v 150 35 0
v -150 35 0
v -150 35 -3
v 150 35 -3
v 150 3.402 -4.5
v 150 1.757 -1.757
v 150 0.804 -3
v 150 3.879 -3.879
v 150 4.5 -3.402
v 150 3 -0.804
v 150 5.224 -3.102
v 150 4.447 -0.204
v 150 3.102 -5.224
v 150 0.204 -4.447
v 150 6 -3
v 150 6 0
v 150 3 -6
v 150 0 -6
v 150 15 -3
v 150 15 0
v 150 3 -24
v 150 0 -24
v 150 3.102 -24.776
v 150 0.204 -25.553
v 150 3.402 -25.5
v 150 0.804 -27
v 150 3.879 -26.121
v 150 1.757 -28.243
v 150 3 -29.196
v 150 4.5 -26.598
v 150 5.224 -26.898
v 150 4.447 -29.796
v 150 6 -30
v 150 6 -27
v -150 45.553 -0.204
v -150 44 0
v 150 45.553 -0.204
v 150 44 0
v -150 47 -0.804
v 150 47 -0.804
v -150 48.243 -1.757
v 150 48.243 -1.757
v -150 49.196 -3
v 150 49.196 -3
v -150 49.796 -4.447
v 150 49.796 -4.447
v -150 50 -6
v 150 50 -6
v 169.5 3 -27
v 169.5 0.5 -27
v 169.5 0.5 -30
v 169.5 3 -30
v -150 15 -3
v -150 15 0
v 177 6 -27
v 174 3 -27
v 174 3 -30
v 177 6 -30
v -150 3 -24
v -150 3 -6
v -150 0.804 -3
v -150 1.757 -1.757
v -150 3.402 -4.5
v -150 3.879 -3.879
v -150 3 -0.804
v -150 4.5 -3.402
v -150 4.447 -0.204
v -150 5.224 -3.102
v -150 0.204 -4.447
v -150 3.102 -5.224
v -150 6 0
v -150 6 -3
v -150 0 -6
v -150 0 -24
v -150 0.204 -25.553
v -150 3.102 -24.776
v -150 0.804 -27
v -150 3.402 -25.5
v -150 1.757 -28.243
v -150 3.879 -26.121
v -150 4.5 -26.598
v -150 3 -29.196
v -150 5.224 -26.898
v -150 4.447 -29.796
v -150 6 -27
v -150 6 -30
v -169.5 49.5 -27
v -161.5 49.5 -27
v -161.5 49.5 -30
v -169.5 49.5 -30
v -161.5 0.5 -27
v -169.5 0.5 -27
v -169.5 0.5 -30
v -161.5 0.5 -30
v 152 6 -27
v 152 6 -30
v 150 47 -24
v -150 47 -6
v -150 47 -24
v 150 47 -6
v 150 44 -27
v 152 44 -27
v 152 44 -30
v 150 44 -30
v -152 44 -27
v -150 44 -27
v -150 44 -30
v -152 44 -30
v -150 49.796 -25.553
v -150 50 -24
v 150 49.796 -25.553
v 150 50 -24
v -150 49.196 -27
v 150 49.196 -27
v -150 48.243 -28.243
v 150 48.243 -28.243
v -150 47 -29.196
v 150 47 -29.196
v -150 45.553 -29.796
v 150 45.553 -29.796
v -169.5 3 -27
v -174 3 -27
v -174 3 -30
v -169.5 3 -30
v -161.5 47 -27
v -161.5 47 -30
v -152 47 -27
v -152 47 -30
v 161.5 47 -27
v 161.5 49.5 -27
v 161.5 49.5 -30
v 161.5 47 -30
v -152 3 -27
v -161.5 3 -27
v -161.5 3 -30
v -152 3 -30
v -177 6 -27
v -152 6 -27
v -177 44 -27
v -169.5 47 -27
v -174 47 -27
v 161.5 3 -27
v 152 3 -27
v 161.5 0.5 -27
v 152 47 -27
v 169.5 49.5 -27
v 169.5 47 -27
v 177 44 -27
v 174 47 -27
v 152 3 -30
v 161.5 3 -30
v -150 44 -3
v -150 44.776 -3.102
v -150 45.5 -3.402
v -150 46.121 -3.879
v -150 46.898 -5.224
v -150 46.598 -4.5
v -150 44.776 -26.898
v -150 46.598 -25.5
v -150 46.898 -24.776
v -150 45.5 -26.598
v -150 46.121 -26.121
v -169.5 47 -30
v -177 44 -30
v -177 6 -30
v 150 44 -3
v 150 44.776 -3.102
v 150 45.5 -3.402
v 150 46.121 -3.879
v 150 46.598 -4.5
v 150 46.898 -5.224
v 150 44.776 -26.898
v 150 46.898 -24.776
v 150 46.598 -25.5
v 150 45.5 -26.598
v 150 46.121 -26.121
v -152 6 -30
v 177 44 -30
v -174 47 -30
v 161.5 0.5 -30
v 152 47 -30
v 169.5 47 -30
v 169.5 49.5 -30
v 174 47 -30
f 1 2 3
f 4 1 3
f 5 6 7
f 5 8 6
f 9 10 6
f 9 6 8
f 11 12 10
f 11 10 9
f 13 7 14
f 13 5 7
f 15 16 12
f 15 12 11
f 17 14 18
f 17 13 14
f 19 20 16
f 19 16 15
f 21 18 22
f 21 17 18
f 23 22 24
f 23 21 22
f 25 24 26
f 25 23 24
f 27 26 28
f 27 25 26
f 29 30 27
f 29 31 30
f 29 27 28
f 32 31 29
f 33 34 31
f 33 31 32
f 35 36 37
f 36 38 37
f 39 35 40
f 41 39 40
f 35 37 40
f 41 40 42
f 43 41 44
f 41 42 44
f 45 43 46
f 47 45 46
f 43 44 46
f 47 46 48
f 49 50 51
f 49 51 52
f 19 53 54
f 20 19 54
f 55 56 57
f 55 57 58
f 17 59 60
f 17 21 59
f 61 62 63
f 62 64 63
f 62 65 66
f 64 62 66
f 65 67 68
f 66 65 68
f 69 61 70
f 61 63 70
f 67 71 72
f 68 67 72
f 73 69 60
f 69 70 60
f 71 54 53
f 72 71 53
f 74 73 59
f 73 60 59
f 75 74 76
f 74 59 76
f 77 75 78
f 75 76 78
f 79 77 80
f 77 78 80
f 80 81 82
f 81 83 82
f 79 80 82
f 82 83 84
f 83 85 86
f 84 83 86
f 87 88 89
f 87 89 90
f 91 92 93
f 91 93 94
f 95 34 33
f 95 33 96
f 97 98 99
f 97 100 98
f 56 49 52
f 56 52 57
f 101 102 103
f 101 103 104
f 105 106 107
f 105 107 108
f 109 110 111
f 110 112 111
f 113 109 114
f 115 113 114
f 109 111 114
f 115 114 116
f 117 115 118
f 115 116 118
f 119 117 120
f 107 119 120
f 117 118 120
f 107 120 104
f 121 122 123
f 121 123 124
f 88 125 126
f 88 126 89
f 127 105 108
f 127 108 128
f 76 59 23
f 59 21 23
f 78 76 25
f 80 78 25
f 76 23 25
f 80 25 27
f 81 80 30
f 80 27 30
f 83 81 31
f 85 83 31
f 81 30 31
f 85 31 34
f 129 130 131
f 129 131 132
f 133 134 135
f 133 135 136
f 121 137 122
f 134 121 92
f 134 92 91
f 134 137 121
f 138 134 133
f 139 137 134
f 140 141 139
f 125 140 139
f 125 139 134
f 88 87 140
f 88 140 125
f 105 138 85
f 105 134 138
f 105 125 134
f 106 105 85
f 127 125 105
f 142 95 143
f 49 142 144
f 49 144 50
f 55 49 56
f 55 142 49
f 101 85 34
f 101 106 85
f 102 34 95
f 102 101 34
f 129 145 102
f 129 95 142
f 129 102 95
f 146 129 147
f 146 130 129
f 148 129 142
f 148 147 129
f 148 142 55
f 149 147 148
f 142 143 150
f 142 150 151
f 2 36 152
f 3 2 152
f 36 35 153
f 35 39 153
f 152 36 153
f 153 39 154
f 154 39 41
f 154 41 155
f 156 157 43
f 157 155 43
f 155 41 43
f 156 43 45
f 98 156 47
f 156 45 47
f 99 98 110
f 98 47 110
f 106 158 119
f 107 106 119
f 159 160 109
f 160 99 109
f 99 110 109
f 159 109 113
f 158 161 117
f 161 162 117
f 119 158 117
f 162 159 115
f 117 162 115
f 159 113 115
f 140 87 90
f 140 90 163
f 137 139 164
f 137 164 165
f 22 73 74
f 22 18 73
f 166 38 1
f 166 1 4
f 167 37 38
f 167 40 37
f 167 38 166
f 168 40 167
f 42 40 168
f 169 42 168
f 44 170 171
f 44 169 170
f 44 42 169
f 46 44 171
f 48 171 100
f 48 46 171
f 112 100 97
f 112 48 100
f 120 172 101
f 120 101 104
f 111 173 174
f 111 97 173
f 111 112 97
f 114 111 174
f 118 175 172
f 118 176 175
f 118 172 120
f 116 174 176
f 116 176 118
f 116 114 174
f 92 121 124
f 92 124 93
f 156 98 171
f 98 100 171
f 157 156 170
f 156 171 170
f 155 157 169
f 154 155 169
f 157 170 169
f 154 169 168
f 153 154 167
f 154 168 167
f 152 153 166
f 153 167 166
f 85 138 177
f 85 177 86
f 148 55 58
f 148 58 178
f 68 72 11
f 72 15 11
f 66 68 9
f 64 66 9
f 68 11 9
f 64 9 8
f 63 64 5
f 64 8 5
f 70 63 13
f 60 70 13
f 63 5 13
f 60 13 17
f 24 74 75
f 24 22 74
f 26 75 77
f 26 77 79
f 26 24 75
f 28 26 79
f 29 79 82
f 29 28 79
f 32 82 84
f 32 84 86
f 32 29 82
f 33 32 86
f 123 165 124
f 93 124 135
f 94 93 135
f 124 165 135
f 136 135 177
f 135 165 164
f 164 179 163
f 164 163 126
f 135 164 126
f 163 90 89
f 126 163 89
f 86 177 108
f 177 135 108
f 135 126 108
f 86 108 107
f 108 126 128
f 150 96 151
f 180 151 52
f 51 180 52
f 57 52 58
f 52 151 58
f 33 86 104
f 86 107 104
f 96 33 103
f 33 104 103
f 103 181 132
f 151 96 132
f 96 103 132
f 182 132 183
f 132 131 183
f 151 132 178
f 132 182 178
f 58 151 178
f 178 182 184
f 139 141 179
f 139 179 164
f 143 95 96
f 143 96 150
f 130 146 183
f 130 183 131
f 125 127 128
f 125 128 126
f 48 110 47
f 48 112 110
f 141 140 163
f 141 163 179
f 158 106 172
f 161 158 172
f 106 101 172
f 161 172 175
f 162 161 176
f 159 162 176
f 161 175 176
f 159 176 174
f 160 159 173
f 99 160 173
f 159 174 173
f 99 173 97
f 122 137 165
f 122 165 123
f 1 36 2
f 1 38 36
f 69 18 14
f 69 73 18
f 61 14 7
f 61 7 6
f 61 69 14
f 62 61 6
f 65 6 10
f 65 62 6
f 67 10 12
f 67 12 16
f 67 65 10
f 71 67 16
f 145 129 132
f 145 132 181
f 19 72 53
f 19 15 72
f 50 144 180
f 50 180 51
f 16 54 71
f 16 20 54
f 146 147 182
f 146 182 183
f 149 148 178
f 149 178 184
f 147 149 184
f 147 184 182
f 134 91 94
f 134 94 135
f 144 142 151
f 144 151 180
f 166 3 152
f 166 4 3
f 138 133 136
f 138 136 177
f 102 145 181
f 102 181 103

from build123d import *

# Parameters (mm, degrees)
BOSS_EXTRUDE1_DEPTH = 150
FILLET1_R           = 6
FILLET2_R           = 3
BOSS_EXTRUDE2_DEPTH = 3


with BuildPart() as part:
    # Sketch2 → Boss-Extrude1 (new body, symmetric)
    with BuildSketch(Plane(origin=(0, 0, 0), x_dir=(0, 0, -1), z_dir=(1, 0, 0))):
        Polygon((0, 0), (30, 0), (30, 50), (0, 50), (0, 35), (3, 35), (3, 47), (27, 47), (27, 3), (3, 3), (3, 15), (0, 15), align=None)
    extrude(amount=BOSS_EXTRUDE1_DEPTH, both=True)

    # Fillet1
    fillet1_edges = [part.edges().sort_by_distance(p)[0] for p in [
        (0, 50, 0),
        (0, 50, -30),
        (0, 0, -30),
        (0, 0, 0),
    ]]
    fillet(fillet1_edges, radius=FILLET1_R)

    # Fillet2
    fillet2_edges = [part.edges().sort_by_distance(p)[0] for p in [
        (0, 3, -3),
        (0, 3, -27),
        (0, 47, -27),
        (0, 47, -3),
    ]]
    fillet(fillet2_edges, radius=FILLET2_R)

    # Sketch3 → Boss-Extrude2 (add)
    with BuildSketch(Plane.XY.offset(-27)):
        Polygon((-150, 44), (-152, 44), (-152, 47), (-161.5, 47), (-161.5, 49.5), (-169.5, 49.5), (-169.5, 47), (-174, 47), (-177, 44), (-177, 6), (-174, 3), (-169.5, 3), (-169.5, 0.5), (-161.5, 0.5), (-161.5, 3), (-152, 3), (-152, 6), (-150, 6), align=None)
        Polygon((174, 3), (177, 6), (177, 44), (174, 47), (169.5, 47), (169.5, 49.5), (161.5, 49.5), (161.5, 47), (152, 47), (152, 44), (150, 44), (150, 6), (152, 6), (152, 3), (161.5, 3), (161.5, 0.5), (169.5, 0.5), (169.5, 3), align=None)
    extrude(amount=-BOSS_EXTRUDE2_DEPTH)


solid = part.part
